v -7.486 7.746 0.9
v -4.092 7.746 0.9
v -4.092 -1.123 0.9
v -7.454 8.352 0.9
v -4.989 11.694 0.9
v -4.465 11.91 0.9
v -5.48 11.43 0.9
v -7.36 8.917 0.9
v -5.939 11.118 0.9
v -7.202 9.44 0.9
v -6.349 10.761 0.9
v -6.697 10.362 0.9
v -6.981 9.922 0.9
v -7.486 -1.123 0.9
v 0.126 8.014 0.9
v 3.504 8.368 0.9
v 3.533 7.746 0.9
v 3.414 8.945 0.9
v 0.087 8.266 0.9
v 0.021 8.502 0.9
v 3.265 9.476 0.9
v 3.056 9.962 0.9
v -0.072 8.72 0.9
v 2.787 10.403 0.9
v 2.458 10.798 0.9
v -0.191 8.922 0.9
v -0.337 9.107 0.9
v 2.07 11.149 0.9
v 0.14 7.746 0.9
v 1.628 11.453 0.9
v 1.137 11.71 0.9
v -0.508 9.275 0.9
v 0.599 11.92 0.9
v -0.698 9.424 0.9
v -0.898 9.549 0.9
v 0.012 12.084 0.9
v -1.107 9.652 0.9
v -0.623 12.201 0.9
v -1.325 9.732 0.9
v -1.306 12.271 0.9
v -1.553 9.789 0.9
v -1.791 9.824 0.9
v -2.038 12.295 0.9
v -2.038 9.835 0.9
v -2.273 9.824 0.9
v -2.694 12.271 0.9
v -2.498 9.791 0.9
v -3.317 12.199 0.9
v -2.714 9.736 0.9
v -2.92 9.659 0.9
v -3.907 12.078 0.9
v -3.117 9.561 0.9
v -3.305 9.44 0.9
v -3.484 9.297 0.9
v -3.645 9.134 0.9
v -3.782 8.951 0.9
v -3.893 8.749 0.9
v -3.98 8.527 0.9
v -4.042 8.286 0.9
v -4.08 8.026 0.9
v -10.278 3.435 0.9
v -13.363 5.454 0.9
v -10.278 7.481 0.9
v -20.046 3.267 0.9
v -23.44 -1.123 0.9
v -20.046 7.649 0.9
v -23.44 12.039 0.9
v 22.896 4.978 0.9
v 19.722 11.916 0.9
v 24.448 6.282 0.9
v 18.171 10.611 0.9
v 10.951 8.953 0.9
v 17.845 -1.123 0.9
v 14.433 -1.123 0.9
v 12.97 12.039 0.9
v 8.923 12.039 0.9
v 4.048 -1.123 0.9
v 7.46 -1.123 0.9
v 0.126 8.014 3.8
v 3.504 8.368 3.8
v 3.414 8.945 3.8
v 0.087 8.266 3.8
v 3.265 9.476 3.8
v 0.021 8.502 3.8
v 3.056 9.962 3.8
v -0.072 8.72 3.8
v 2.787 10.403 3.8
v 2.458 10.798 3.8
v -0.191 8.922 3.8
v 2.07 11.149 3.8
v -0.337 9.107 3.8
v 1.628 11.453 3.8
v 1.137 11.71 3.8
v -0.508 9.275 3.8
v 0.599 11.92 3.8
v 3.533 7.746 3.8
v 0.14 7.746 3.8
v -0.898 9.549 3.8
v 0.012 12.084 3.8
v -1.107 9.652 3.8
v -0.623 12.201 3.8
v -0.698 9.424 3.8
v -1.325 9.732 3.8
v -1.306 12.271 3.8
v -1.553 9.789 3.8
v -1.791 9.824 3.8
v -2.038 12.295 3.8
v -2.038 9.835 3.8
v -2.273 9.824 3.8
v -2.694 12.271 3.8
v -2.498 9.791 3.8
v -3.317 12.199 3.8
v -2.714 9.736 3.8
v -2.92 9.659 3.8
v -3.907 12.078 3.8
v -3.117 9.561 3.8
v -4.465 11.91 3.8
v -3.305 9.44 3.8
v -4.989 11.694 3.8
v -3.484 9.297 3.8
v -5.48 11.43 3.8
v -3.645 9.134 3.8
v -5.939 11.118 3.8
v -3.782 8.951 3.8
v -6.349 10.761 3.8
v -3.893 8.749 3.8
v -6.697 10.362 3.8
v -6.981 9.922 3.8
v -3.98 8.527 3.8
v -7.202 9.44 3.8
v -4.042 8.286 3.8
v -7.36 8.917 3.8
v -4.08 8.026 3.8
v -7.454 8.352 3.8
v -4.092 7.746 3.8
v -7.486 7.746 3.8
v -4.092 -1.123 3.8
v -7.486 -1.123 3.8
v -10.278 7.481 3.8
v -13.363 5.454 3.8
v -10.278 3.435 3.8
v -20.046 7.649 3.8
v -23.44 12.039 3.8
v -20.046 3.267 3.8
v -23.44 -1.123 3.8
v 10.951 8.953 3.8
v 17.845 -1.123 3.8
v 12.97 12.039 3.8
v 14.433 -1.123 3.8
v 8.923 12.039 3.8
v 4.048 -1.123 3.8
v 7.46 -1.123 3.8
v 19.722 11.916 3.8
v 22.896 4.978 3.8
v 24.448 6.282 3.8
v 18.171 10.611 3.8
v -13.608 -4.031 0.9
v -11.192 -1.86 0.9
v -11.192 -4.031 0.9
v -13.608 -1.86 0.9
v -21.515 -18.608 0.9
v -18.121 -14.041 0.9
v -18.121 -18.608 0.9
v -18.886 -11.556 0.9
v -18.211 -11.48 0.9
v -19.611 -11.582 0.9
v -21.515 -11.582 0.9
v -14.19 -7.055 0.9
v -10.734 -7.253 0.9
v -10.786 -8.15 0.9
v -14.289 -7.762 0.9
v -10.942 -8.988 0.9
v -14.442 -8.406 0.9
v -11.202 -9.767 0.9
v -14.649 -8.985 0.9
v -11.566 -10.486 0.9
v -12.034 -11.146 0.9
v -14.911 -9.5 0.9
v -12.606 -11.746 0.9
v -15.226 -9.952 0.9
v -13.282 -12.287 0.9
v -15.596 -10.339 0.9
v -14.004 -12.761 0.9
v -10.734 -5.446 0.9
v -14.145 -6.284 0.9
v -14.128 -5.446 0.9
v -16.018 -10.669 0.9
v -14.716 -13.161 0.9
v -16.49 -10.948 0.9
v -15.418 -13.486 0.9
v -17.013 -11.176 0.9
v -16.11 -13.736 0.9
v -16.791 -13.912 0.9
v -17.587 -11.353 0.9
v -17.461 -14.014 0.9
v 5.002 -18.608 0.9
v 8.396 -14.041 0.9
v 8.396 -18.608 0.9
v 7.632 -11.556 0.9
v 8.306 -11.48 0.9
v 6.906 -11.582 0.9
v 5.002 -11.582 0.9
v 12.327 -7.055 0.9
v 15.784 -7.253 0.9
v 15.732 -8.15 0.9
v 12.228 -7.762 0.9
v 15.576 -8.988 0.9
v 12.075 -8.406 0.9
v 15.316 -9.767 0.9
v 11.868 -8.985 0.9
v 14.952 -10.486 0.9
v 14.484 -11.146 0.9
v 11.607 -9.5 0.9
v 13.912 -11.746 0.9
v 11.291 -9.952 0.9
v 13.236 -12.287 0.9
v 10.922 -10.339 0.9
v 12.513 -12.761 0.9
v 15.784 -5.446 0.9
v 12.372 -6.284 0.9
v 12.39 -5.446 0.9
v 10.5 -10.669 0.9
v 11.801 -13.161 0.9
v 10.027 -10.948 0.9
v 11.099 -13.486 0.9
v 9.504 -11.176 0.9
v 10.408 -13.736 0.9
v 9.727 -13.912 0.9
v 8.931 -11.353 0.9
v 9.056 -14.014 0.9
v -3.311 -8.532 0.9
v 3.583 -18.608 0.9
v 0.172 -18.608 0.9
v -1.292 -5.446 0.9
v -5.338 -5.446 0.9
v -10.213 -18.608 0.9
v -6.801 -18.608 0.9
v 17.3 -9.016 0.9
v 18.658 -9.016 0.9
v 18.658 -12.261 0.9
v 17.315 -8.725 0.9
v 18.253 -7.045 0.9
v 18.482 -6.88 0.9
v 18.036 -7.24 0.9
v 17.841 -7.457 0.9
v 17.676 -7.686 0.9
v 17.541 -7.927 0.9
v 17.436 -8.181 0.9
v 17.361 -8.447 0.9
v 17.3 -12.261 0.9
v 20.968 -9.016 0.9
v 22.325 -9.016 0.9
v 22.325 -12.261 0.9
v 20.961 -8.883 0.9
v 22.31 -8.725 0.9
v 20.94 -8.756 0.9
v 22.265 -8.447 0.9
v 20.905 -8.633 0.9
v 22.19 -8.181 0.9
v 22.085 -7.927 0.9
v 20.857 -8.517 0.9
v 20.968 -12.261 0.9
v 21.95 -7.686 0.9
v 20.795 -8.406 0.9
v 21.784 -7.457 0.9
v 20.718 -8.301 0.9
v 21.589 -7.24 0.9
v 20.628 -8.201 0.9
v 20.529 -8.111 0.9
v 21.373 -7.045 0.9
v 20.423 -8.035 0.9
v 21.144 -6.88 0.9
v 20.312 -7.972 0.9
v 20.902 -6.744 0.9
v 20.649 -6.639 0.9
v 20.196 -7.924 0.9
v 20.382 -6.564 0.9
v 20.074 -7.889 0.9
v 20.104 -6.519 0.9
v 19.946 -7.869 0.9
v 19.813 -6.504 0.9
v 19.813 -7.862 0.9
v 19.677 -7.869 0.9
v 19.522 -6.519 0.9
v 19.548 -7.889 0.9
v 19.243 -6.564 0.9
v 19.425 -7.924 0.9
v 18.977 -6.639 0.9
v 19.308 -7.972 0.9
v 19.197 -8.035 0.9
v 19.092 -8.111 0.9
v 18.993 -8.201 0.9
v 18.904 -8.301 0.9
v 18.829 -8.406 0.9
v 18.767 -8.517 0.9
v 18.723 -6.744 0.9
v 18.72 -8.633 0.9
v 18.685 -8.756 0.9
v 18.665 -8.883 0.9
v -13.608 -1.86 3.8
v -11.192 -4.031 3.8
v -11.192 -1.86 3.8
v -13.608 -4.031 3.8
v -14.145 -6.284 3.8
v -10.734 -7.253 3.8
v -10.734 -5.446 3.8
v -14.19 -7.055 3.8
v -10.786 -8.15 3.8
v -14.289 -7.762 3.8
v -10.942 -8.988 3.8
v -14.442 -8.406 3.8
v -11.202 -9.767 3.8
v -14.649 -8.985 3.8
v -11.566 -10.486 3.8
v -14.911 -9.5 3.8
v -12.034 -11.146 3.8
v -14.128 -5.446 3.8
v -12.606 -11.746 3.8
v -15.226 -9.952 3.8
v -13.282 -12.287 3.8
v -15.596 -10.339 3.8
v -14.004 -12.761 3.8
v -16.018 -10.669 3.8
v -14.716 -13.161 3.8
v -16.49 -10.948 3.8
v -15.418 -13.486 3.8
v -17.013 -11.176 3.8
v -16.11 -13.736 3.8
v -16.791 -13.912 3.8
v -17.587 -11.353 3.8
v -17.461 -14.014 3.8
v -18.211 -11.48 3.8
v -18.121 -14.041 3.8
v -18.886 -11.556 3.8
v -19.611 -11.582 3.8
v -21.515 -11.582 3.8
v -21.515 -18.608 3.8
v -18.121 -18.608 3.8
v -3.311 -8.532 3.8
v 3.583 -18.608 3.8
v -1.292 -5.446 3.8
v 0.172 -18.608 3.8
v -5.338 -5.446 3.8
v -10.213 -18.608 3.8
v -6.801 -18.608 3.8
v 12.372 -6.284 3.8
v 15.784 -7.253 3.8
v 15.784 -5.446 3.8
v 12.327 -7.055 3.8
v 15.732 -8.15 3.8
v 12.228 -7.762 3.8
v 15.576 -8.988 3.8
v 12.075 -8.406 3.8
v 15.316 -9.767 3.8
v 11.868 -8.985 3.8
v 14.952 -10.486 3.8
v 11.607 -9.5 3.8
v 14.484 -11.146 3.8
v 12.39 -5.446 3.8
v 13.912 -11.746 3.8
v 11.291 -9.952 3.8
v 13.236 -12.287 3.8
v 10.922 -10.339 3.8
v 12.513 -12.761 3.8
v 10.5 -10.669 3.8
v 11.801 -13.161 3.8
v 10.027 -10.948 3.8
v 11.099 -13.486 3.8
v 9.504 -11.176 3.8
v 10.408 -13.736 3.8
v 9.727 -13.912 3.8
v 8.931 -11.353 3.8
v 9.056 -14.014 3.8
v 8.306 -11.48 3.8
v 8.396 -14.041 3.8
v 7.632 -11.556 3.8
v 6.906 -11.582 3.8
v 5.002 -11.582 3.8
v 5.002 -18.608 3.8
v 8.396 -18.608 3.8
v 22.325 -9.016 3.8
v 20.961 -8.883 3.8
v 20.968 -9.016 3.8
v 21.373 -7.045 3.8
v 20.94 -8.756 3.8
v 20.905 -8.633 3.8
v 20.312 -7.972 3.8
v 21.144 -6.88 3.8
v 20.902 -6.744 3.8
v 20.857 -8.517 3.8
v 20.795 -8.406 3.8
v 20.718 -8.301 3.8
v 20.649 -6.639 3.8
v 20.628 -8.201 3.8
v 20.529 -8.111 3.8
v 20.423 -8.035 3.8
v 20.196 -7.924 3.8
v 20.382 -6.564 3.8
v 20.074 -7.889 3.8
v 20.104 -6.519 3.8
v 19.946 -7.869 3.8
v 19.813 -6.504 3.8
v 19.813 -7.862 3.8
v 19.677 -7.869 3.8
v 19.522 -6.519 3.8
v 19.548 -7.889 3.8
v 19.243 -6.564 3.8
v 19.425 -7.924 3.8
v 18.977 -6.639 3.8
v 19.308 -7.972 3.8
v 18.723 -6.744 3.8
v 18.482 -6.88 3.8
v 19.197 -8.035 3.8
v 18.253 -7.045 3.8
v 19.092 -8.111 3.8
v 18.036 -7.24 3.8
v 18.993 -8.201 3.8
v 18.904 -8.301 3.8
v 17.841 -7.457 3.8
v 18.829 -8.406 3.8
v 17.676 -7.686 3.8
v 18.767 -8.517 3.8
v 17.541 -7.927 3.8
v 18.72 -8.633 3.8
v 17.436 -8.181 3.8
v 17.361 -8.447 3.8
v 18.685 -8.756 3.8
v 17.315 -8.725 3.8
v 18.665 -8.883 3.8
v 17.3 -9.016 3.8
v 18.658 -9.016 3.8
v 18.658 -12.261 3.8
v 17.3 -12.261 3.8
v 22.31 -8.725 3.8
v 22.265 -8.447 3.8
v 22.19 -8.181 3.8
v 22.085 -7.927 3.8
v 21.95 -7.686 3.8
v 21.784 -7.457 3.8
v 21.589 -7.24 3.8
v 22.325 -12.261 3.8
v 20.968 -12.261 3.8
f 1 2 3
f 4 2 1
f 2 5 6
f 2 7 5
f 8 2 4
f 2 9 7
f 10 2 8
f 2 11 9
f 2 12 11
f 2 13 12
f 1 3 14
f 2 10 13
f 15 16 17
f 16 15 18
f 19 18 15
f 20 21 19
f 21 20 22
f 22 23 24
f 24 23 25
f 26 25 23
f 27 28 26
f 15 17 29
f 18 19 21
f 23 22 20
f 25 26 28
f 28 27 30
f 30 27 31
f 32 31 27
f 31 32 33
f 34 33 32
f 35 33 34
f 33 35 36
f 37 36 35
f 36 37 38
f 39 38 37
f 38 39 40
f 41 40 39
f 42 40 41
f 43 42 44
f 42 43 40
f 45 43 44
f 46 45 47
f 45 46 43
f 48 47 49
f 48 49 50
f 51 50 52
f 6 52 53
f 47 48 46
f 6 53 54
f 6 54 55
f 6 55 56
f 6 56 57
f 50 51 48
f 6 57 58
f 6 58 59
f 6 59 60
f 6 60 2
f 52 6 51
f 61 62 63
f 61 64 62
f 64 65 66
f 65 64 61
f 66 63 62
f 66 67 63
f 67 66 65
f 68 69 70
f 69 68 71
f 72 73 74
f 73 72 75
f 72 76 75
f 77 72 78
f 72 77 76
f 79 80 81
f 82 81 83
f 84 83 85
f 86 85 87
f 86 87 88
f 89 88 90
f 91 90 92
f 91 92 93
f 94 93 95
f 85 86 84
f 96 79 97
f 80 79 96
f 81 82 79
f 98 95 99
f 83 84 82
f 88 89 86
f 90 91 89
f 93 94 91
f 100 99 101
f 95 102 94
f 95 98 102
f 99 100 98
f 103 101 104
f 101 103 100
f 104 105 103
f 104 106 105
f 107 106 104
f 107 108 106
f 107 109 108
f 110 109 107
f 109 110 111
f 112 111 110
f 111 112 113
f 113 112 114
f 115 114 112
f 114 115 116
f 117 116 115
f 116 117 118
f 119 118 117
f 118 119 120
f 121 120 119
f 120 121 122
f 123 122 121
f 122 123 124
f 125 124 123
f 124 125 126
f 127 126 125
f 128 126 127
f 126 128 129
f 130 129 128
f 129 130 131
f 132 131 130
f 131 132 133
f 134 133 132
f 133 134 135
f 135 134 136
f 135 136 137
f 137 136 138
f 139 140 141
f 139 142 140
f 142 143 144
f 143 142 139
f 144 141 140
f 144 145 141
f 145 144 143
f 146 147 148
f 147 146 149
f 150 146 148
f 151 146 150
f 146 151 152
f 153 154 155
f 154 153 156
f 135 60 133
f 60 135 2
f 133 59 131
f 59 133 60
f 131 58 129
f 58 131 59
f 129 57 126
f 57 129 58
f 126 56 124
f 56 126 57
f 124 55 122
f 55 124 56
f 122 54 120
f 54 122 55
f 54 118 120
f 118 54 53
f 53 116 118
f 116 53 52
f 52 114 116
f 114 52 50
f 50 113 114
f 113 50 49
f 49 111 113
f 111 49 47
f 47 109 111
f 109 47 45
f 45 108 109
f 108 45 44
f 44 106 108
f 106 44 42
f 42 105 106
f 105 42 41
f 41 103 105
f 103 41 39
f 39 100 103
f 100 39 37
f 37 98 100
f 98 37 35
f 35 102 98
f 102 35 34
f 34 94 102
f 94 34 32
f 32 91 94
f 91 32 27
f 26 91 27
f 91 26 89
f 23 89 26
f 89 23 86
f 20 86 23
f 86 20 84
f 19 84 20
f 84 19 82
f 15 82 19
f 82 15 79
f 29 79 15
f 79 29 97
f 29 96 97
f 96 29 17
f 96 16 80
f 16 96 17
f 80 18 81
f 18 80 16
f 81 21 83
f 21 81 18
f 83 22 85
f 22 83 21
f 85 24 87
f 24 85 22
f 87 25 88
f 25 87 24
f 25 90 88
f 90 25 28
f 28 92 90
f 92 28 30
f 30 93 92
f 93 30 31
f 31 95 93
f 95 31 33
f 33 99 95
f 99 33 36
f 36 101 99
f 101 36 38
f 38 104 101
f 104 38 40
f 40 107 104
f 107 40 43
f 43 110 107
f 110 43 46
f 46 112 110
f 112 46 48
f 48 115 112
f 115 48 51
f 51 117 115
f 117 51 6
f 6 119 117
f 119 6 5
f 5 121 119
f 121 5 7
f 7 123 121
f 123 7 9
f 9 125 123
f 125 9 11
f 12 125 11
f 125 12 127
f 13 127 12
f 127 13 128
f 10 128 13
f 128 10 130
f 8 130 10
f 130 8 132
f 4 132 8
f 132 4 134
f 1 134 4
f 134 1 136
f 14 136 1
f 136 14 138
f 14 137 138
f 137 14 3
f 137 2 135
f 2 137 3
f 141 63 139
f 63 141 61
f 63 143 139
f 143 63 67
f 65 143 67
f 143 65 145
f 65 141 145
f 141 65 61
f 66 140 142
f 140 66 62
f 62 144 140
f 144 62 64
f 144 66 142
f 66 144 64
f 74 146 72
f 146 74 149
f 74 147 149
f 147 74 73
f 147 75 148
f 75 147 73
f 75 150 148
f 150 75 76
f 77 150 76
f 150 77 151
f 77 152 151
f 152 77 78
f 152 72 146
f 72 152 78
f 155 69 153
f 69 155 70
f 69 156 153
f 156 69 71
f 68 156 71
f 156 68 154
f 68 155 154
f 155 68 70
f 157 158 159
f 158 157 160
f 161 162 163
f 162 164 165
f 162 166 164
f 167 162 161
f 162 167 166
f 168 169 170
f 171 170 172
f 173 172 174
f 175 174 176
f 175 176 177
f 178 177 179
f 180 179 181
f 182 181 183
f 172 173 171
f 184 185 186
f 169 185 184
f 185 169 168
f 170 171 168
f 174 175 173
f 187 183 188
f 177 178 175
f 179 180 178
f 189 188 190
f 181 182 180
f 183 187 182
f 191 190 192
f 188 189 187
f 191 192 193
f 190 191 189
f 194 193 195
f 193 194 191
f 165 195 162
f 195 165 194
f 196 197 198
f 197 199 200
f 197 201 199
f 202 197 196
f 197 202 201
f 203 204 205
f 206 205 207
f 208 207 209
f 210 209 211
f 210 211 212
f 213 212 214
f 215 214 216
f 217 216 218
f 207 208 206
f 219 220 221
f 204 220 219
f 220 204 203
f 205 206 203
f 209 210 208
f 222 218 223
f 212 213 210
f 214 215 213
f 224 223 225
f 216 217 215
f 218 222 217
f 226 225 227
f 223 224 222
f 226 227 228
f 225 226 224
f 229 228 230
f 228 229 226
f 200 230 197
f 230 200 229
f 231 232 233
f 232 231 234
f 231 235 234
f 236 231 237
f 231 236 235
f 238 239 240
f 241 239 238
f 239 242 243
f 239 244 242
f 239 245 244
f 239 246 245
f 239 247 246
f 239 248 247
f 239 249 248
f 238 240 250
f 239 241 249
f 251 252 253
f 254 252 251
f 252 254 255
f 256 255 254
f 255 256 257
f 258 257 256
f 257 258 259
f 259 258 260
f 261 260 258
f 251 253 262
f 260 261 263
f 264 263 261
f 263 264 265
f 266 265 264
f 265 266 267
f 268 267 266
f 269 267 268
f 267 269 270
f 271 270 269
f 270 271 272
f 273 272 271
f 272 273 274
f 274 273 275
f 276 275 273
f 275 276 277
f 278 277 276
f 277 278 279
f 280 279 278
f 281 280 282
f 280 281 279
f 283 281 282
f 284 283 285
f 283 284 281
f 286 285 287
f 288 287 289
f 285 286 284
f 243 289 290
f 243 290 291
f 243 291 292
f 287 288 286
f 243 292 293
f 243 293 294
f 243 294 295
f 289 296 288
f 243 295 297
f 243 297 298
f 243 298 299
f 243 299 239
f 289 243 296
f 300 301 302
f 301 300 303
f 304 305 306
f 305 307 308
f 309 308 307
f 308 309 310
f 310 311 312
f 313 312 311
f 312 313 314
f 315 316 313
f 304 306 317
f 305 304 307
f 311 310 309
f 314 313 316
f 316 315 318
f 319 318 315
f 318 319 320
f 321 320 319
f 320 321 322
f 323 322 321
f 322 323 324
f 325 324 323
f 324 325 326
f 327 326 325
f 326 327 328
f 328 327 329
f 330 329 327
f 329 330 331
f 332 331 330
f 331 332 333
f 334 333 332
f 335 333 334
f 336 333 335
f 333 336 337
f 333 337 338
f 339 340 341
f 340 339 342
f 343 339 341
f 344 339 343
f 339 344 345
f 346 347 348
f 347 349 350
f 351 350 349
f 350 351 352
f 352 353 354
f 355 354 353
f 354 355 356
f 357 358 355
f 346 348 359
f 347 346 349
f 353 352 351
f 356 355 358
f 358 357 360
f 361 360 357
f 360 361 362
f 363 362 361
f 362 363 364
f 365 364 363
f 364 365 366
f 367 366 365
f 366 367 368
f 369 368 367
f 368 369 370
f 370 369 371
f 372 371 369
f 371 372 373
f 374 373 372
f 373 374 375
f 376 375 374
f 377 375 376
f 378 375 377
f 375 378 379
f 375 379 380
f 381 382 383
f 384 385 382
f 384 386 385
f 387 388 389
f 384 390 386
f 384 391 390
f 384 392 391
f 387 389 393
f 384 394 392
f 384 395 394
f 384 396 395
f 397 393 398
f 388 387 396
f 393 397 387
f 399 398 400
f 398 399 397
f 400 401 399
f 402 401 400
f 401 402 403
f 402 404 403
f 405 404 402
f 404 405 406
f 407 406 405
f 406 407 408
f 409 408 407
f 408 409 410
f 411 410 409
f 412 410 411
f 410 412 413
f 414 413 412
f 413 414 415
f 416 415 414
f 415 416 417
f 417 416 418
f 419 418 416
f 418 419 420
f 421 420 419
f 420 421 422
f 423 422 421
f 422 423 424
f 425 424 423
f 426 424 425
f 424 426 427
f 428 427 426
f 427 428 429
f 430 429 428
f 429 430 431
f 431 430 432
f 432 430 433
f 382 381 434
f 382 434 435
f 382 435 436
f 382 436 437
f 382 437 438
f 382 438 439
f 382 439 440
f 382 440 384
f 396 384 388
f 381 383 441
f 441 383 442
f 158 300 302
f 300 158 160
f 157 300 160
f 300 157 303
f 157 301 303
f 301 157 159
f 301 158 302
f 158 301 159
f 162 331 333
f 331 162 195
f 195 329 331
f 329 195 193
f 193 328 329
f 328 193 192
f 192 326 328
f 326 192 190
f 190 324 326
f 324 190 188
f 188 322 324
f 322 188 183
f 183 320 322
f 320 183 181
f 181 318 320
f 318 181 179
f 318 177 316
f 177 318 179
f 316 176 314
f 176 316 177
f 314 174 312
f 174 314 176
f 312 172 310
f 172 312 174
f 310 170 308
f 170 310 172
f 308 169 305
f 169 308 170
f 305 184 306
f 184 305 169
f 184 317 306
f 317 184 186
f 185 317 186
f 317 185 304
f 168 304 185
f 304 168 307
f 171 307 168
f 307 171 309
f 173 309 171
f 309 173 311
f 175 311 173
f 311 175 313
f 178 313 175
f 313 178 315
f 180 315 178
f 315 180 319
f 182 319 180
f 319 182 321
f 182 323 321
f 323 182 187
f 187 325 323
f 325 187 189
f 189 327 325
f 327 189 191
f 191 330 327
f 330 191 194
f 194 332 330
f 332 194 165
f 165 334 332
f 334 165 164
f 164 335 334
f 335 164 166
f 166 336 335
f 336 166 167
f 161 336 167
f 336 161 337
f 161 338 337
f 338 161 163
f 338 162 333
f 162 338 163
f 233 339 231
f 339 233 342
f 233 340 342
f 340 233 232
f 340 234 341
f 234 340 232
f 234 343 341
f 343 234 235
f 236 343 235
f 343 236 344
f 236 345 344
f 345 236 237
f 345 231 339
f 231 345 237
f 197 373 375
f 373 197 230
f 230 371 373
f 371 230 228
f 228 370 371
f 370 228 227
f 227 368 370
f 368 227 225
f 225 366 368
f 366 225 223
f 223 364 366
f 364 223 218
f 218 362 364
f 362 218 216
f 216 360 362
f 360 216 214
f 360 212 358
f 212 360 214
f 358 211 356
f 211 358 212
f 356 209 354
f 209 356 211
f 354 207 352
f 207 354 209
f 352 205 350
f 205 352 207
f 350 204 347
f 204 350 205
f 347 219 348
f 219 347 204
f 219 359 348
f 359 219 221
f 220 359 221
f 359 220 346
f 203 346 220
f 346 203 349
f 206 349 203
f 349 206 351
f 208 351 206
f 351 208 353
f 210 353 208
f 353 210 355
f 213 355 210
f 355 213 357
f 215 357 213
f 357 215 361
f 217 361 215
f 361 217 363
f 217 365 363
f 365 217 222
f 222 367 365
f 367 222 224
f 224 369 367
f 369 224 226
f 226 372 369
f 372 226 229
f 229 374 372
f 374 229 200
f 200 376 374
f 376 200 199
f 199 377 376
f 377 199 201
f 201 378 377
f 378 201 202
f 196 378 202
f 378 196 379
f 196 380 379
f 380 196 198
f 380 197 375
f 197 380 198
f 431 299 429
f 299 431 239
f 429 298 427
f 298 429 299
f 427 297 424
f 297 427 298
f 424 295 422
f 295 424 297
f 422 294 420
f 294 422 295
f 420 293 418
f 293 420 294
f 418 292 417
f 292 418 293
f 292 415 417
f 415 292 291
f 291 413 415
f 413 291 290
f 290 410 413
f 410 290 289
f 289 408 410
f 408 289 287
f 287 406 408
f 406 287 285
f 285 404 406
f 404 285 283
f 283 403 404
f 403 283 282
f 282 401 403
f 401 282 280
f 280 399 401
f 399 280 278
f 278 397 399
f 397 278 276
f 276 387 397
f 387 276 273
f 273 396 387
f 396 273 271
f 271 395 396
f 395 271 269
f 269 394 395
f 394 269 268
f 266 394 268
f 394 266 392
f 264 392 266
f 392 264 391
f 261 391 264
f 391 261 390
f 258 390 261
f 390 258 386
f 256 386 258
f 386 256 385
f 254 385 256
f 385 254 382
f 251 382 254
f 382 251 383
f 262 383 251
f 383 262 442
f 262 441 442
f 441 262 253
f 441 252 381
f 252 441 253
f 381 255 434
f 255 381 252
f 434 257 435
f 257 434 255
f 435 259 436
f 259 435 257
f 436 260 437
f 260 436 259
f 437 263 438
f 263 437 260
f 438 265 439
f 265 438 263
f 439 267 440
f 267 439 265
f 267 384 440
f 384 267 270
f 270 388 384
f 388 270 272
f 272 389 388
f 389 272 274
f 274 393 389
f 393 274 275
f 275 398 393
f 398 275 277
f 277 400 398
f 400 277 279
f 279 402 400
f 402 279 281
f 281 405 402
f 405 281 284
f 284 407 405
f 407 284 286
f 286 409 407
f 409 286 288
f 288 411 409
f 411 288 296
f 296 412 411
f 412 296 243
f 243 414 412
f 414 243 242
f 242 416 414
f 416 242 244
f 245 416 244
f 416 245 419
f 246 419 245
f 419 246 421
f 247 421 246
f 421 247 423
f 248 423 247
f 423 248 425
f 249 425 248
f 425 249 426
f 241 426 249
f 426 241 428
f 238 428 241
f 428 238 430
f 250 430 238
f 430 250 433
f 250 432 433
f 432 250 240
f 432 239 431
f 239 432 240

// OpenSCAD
$fn = 48;
  // syllabics (overlaid on icon, tallest)
  translate([0, 5.430, 0.900]) linear_extrude(height=2.900) text("ᐅᒋᐱᐠ", size=13.000, halign="center", valign="center", font="Euphemia UCAS:style=Bold");
  translate([0, -10.430, 0.900]) linear_extrude(height=2.900) text("ᓰᐱᓯᐢ", size=13.000, halign="center", valign="center", font="Euphemia UCAS:style=Bold");
